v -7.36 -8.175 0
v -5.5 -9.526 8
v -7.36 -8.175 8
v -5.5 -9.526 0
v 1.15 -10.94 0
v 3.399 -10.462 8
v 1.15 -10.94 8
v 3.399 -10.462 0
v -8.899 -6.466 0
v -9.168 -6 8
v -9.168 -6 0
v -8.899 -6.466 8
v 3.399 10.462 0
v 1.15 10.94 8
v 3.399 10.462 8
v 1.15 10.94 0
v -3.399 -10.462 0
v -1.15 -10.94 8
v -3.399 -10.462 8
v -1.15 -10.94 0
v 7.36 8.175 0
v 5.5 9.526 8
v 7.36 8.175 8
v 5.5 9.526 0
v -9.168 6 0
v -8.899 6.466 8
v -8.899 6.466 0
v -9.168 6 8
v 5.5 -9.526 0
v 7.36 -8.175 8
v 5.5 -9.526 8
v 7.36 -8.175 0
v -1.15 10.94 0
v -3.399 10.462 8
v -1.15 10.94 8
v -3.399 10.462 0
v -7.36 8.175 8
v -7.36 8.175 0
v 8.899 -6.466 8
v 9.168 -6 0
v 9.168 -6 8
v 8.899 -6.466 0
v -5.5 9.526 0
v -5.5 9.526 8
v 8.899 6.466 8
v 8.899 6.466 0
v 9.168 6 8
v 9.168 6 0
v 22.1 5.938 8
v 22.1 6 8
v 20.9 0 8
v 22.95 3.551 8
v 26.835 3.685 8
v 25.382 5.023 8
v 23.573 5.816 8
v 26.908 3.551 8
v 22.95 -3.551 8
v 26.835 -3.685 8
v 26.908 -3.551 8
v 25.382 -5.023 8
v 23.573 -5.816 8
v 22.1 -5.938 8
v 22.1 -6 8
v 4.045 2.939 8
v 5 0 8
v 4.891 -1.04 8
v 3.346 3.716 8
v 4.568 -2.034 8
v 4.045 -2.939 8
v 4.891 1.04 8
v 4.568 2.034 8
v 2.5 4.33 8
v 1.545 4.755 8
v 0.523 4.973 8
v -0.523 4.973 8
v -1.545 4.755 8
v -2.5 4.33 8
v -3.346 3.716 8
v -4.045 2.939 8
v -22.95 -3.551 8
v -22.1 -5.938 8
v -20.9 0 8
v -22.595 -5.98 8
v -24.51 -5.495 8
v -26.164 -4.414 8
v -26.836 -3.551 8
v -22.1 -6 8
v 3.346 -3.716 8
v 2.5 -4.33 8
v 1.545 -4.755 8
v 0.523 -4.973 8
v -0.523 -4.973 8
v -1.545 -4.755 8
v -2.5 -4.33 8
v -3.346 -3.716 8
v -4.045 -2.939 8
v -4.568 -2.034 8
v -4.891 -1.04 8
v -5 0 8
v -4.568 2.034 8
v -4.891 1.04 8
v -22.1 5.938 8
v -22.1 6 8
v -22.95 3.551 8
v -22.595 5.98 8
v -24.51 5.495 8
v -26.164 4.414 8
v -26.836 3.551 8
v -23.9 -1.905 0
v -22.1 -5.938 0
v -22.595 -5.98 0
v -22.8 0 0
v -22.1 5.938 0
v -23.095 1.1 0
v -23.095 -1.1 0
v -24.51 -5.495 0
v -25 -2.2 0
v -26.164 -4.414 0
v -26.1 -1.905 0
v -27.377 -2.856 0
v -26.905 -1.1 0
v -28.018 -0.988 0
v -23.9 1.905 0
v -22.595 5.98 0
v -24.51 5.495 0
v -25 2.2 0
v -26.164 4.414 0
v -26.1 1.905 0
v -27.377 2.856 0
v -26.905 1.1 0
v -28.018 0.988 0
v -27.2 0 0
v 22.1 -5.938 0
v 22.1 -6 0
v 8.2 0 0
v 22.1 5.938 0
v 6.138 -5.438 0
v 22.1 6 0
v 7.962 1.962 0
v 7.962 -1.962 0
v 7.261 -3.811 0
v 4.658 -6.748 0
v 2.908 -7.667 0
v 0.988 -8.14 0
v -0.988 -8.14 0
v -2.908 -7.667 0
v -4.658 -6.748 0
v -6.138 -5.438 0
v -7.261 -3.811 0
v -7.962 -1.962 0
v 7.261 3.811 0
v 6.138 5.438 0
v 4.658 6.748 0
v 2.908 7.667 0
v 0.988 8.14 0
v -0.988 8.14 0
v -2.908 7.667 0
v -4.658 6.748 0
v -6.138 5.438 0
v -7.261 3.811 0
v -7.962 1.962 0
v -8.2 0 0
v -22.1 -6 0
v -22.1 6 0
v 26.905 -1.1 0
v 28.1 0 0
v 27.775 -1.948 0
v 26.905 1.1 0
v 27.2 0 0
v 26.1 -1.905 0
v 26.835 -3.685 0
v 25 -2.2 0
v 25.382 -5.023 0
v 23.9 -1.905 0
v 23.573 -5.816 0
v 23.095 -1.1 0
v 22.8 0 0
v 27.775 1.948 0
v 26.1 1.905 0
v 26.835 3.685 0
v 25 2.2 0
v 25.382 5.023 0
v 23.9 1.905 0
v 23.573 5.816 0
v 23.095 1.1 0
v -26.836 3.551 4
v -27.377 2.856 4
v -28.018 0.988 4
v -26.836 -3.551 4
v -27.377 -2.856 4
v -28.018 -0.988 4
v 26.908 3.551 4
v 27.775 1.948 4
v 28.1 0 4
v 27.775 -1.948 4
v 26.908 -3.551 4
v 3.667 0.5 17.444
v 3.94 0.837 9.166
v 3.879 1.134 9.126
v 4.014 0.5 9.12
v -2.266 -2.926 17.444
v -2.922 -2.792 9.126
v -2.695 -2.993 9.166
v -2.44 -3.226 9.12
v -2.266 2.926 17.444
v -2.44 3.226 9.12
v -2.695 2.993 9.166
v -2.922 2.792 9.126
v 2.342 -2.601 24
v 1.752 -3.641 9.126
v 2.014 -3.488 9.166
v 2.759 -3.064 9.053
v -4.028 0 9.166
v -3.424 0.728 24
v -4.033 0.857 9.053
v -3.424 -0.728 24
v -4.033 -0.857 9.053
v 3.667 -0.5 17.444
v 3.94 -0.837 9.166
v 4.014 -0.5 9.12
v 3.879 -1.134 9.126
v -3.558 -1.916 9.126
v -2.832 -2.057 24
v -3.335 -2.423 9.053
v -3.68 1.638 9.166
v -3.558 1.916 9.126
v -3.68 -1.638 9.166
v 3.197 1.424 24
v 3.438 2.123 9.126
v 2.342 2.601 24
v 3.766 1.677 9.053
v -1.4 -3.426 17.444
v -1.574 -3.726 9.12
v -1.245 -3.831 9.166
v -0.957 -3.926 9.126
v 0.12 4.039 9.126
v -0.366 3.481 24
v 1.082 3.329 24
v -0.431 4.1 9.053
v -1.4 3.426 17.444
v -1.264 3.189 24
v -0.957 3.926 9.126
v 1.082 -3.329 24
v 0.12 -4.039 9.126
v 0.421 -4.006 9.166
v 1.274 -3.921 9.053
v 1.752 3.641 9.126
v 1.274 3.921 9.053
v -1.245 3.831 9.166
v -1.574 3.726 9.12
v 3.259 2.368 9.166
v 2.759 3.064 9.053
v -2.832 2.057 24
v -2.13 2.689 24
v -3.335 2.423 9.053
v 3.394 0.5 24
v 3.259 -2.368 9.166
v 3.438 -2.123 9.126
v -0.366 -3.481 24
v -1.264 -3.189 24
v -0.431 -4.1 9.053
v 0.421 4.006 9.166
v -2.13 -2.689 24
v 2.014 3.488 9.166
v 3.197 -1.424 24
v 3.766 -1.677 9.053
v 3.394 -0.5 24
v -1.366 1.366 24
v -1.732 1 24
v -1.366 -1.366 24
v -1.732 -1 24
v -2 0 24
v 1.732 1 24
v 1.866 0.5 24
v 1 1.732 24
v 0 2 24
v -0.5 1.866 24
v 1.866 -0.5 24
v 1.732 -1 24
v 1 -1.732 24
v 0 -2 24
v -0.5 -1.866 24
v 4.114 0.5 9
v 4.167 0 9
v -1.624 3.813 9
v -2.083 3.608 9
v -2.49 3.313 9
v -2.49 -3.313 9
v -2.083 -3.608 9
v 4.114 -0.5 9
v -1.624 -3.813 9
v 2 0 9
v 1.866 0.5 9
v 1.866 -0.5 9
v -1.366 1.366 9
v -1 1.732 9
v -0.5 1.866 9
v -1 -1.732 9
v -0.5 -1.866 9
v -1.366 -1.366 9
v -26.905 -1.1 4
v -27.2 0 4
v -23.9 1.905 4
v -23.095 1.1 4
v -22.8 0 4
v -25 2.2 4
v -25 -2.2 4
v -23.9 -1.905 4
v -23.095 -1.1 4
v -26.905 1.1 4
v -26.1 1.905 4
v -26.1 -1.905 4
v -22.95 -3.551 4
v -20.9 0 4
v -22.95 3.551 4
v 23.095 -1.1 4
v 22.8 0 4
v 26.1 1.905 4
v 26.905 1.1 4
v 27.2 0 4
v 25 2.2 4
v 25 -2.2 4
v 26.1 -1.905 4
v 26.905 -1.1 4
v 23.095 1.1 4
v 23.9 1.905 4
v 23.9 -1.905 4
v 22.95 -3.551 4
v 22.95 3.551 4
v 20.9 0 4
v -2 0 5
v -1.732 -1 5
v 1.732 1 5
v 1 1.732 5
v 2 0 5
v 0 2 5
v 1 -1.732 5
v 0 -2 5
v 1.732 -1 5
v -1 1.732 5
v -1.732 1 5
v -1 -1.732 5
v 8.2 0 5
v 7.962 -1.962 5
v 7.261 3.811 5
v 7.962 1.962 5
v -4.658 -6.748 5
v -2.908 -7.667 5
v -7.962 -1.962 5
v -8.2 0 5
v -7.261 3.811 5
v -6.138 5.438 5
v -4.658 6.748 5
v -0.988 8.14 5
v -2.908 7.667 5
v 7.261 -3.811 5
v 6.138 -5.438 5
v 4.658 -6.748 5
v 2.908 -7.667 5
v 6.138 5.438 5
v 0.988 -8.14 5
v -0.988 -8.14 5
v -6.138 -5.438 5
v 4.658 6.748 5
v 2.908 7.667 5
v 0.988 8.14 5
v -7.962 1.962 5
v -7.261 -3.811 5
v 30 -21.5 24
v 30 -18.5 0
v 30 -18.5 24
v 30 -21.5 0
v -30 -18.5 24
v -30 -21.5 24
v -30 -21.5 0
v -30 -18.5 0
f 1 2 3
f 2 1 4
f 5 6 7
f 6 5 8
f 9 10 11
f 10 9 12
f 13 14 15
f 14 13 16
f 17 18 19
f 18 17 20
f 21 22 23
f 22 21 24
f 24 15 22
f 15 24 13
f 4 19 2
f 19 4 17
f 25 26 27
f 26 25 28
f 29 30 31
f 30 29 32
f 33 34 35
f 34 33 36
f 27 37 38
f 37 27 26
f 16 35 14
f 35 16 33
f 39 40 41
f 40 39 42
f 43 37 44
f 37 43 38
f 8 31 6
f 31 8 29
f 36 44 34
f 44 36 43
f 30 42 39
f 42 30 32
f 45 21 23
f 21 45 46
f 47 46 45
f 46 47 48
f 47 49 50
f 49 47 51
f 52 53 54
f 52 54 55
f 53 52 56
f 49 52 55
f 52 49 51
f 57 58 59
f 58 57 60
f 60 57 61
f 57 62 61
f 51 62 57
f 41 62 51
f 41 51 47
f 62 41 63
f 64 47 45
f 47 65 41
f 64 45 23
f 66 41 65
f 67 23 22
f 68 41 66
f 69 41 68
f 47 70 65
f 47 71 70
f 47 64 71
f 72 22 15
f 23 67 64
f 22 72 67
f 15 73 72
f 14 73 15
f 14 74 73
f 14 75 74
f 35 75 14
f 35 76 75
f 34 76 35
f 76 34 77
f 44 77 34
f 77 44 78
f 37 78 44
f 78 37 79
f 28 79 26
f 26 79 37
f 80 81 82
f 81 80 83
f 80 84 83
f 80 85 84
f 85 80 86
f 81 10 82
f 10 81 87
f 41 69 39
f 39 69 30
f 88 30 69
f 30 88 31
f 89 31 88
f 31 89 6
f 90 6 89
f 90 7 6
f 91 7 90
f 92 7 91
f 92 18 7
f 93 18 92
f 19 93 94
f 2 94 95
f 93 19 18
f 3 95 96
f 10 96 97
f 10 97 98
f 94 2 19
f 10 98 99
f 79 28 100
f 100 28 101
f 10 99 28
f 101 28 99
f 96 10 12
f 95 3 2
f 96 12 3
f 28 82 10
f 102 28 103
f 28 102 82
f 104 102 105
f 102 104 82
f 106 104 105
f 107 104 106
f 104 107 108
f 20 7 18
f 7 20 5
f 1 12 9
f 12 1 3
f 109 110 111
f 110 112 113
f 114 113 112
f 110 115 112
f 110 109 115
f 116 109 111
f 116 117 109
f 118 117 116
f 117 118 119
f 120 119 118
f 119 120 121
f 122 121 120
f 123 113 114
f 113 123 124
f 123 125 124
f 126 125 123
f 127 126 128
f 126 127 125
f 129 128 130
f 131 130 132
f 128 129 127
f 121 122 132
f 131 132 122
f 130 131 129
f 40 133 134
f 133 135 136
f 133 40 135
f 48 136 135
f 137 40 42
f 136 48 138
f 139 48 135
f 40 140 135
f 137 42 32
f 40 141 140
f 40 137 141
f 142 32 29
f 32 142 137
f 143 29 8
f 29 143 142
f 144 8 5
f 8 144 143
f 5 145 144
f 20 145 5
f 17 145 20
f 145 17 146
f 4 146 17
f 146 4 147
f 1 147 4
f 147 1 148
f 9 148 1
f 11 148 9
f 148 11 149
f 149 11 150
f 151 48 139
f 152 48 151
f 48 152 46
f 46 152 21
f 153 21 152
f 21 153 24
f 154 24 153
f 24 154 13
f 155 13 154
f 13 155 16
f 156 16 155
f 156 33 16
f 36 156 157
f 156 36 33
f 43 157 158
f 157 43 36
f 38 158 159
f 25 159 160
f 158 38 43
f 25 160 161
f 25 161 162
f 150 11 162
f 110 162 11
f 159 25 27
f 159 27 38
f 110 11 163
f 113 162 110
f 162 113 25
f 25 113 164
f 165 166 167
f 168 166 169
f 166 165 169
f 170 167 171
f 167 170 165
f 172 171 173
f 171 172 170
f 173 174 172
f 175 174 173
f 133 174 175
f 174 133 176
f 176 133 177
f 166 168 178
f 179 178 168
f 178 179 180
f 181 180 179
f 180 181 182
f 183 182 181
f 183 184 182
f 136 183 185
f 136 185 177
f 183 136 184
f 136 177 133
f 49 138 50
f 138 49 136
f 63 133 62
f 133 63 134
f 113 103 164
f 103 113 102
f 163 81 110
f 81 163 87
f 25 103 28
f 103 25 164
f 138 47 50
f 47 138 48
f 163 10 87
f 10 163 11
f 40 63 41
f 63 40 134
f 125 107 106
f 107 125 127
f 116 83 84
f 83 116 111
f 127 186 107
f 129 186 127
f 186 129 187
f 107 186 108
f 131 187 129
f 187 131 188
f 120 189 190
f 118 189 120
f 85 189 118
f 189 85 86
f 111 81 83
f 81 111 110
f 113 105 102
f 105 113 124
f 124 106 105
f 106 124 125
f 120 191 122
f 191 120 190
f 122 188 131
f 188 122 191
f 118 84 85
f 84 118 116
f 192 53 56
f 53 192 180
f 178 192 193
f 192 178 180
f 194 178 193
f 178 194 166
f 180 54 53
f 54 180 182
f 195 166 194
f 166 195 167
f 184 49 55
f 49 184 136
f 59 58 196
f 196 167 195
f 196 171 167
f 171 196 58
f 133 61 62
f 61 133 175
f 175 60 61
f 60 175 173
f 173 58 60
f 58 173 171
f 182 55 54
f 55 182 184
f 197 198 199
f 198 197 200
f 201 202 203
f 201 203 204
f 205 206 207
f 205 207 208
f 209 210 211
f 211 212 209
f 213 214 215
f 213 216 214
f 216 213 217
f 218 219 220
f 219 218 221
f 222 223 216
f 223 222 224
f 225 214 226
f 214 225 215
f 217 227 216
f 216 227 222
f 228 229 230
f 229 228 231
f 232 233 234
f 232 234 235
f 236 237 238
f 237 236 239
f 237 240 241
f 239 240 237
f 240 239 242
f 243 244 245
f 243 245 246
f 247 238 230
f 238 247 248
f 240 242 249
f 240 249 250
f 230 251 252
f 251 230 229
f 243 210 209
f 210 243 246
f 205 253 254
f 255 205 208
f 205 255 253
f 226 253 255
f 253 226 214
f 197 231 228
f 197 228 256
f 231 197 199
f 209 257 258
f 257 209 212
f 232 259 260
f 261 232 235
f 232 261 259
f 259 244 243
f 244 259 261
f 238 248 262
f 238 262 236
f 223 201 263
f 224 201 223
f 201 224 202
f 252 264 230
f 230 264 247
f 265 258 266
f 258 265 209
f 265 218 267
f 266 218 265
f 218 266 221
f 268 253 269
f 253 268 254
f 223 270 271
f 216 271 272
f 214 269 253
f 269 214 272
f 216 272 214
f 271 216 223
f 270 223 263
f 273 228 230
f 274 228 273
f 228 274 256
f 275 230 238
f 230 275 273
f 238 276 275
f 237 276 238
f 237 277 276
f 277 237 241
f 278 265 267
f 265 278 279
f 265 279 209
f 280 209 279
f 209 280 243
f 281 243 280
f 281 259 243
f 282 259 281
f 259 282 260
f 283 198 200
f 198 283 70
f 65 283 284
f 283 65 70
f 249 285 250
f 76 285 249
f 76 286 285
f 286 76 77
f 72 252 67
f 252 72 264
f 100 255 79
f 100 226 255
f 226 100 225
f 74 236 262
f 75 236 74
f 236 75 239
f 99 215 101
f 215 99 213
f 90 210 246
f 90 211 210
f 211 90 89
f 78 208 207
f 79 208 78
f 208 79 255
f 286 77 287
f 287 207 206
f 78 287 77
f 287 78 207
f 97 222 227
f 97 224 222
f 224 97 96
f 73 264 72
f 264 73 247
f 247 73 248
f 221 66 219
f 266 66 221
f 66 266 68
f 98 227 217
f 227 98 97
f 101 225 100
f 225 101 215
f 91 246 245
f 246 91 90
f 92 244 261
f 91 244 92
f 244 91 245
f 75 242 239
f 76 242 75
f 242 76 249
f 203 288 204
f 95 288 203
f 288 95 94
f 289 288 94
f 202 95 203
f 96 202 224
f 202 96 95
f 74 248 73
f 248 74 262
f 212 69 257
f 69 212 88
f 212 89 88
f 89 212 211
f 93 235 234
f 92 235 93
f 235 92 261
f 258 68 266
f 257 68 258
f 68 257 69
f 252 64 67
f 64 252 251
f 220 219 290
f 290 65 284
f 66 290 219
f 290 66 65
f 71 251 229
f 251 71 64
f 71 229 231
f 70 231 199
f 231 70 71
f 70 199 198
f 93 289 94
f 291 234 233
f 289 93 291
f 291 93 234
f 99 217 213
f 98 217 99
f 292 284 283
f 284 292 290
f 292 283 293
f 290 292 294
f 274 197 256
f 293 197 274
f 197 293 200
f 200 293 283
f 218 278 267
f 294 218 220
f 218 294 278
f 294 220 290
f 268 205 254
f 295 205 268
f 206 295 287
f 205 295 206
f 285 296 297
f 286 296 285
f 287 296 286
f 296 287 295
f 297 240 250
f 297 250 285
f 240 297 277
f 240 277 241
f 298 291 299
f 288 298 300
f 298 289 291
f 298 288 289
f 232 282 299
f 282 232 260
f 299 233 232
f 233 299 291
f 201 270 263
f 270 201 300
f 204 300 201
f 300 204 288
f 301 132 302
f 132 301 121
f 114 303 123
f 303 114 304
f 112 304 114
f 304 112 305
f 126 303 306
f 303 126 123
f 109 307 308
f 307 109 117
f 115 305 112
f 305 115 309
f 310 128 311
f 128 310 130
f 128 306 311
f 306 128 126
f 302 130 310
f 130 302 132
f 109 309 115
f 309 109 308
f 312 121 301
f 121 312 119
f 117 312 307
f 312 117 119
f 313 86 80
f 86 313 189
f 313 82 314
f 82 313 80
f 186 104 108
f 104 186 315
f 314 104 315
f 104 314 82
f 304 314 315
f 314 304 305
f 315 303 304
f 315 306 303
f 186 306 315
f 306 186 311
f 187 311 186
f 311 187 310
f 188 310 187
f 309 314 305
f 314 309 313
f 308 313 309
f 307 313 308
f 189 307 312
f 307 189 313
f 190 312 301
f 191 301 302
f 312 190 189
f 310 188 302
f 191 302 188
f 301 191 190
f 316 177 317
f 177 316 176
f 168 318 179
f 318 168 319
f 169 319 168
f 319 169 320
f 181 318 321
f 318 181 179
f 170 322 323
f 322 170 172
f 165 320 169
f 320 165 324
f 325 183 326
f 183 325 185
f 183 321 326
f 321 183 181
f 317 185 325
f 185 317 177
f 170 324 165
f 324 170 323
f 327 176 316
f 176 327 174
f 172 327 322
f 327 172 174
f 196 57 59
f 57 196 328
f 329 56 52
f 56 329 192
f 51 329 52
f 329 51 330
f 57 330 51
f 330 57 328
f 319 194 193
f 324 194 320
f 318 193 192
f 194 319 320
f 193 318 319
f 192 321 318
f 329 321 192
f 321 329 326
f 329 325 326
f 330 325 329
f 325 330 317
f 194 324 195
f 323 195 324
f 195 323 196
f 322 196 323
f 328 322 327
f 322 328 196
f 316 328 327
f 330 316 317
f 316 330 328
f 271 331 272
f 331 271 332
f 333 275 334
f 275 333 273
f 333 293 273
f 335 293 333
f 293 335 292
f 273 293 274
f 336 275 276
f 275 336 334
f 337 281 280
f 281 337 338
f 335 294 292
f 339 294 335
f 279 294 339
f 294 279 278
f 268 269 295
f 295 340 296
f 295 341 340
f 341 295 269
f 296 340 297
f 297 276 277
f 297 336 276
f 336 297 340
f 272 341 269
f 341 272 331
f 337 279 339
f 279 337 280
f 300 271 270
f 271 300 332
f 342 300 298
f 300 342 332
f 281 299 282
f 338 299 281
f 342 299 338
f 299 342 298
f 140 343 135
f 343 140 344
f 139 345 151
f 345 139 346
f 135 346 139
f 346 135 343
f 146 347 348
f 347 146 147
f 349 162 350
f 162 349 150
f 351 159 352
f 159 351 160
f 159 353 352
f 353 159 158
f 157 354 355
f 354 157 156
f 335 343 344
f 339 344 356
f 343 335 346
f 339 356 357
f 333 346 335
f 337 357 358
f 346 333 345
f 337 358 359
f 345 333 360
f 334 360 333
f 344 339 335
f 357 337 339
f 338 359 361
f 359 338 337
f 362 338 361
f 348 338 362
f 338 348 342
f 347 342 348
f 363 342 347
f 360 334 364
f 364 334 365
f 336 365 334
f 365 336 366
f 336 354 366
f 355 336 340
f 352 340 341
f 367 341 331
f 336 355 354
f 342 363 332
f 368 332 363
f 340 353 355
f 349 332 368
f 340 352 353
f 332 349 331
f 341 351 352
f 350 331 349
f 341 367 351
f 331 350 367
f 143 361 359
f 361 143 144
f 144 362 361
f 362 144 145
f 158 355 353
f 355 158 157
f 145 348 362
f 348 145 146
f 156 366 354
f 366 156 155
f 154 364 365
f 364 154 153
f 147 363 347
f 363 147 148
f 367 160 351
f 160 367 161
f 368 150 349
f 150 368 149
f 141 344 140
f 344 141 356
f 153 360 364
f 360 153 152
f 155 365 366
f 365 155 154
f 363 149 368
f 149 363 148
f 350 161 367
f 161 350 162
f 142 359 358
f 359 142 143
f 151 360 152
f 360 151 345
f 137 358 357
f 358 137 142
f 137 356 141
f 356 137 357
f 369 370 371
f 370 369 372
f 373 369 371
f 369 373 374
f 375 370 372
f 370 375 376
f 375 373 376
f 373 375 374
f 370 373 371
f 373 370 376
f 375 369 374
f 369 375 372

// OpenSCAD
module clamp(h, base){
  difference(){
    union() {
      // Clamp cone for M8 nut.
      cylinder(r1=4.5, r2=3.5, h=h);
      // Gradual cone base.
      translate([0, 0, base]) cylinder(r1=10, r2=0, h=12, center=true);
      // Base middle.
      translate([0, 0, base/2]) {
	cylinder(r=11, h=base, center=true);
	cube([44.2, 12, base], center=true);
      }
      // Base around screw holes.
      for (x = [-22.1, 22.1]) {
	translate([x, 0, base/2]) cylinder(r=6, h=base, center=true);
      }
    }
    // Bowden cable through hole.
    cylinder(r=2, h=30, $fn=12);
    // Three sided cutout.
    for (a = [0:120:359]) {
      rotate([0, 0, a]) translate([3, 0, base+1+h/2])
	cube([5, 1, h], center=true);
    }
    // Bottom opening for PEEK insulator (e.g. MakerGear GrooveMount).
    cylinder(r=8.2, h=10, center=true);
    // Nut traps and screw holes.
    for (x = [-25, 25]) {
      translate([x, 0, base/2]) {
	cylinder(r = 2.2, h=base+1, center=true, $fn=12);
	rotate([0, 0, 0]) cylinder(r=4.1, h=base, $fn=6);
      }
    }
  }
}

height = 24;
clamp(height, 8);

// Increase cooling time per layer for the thin riser.
translate([0, -20, height/2]) cube([60, 3, height], center=true);
